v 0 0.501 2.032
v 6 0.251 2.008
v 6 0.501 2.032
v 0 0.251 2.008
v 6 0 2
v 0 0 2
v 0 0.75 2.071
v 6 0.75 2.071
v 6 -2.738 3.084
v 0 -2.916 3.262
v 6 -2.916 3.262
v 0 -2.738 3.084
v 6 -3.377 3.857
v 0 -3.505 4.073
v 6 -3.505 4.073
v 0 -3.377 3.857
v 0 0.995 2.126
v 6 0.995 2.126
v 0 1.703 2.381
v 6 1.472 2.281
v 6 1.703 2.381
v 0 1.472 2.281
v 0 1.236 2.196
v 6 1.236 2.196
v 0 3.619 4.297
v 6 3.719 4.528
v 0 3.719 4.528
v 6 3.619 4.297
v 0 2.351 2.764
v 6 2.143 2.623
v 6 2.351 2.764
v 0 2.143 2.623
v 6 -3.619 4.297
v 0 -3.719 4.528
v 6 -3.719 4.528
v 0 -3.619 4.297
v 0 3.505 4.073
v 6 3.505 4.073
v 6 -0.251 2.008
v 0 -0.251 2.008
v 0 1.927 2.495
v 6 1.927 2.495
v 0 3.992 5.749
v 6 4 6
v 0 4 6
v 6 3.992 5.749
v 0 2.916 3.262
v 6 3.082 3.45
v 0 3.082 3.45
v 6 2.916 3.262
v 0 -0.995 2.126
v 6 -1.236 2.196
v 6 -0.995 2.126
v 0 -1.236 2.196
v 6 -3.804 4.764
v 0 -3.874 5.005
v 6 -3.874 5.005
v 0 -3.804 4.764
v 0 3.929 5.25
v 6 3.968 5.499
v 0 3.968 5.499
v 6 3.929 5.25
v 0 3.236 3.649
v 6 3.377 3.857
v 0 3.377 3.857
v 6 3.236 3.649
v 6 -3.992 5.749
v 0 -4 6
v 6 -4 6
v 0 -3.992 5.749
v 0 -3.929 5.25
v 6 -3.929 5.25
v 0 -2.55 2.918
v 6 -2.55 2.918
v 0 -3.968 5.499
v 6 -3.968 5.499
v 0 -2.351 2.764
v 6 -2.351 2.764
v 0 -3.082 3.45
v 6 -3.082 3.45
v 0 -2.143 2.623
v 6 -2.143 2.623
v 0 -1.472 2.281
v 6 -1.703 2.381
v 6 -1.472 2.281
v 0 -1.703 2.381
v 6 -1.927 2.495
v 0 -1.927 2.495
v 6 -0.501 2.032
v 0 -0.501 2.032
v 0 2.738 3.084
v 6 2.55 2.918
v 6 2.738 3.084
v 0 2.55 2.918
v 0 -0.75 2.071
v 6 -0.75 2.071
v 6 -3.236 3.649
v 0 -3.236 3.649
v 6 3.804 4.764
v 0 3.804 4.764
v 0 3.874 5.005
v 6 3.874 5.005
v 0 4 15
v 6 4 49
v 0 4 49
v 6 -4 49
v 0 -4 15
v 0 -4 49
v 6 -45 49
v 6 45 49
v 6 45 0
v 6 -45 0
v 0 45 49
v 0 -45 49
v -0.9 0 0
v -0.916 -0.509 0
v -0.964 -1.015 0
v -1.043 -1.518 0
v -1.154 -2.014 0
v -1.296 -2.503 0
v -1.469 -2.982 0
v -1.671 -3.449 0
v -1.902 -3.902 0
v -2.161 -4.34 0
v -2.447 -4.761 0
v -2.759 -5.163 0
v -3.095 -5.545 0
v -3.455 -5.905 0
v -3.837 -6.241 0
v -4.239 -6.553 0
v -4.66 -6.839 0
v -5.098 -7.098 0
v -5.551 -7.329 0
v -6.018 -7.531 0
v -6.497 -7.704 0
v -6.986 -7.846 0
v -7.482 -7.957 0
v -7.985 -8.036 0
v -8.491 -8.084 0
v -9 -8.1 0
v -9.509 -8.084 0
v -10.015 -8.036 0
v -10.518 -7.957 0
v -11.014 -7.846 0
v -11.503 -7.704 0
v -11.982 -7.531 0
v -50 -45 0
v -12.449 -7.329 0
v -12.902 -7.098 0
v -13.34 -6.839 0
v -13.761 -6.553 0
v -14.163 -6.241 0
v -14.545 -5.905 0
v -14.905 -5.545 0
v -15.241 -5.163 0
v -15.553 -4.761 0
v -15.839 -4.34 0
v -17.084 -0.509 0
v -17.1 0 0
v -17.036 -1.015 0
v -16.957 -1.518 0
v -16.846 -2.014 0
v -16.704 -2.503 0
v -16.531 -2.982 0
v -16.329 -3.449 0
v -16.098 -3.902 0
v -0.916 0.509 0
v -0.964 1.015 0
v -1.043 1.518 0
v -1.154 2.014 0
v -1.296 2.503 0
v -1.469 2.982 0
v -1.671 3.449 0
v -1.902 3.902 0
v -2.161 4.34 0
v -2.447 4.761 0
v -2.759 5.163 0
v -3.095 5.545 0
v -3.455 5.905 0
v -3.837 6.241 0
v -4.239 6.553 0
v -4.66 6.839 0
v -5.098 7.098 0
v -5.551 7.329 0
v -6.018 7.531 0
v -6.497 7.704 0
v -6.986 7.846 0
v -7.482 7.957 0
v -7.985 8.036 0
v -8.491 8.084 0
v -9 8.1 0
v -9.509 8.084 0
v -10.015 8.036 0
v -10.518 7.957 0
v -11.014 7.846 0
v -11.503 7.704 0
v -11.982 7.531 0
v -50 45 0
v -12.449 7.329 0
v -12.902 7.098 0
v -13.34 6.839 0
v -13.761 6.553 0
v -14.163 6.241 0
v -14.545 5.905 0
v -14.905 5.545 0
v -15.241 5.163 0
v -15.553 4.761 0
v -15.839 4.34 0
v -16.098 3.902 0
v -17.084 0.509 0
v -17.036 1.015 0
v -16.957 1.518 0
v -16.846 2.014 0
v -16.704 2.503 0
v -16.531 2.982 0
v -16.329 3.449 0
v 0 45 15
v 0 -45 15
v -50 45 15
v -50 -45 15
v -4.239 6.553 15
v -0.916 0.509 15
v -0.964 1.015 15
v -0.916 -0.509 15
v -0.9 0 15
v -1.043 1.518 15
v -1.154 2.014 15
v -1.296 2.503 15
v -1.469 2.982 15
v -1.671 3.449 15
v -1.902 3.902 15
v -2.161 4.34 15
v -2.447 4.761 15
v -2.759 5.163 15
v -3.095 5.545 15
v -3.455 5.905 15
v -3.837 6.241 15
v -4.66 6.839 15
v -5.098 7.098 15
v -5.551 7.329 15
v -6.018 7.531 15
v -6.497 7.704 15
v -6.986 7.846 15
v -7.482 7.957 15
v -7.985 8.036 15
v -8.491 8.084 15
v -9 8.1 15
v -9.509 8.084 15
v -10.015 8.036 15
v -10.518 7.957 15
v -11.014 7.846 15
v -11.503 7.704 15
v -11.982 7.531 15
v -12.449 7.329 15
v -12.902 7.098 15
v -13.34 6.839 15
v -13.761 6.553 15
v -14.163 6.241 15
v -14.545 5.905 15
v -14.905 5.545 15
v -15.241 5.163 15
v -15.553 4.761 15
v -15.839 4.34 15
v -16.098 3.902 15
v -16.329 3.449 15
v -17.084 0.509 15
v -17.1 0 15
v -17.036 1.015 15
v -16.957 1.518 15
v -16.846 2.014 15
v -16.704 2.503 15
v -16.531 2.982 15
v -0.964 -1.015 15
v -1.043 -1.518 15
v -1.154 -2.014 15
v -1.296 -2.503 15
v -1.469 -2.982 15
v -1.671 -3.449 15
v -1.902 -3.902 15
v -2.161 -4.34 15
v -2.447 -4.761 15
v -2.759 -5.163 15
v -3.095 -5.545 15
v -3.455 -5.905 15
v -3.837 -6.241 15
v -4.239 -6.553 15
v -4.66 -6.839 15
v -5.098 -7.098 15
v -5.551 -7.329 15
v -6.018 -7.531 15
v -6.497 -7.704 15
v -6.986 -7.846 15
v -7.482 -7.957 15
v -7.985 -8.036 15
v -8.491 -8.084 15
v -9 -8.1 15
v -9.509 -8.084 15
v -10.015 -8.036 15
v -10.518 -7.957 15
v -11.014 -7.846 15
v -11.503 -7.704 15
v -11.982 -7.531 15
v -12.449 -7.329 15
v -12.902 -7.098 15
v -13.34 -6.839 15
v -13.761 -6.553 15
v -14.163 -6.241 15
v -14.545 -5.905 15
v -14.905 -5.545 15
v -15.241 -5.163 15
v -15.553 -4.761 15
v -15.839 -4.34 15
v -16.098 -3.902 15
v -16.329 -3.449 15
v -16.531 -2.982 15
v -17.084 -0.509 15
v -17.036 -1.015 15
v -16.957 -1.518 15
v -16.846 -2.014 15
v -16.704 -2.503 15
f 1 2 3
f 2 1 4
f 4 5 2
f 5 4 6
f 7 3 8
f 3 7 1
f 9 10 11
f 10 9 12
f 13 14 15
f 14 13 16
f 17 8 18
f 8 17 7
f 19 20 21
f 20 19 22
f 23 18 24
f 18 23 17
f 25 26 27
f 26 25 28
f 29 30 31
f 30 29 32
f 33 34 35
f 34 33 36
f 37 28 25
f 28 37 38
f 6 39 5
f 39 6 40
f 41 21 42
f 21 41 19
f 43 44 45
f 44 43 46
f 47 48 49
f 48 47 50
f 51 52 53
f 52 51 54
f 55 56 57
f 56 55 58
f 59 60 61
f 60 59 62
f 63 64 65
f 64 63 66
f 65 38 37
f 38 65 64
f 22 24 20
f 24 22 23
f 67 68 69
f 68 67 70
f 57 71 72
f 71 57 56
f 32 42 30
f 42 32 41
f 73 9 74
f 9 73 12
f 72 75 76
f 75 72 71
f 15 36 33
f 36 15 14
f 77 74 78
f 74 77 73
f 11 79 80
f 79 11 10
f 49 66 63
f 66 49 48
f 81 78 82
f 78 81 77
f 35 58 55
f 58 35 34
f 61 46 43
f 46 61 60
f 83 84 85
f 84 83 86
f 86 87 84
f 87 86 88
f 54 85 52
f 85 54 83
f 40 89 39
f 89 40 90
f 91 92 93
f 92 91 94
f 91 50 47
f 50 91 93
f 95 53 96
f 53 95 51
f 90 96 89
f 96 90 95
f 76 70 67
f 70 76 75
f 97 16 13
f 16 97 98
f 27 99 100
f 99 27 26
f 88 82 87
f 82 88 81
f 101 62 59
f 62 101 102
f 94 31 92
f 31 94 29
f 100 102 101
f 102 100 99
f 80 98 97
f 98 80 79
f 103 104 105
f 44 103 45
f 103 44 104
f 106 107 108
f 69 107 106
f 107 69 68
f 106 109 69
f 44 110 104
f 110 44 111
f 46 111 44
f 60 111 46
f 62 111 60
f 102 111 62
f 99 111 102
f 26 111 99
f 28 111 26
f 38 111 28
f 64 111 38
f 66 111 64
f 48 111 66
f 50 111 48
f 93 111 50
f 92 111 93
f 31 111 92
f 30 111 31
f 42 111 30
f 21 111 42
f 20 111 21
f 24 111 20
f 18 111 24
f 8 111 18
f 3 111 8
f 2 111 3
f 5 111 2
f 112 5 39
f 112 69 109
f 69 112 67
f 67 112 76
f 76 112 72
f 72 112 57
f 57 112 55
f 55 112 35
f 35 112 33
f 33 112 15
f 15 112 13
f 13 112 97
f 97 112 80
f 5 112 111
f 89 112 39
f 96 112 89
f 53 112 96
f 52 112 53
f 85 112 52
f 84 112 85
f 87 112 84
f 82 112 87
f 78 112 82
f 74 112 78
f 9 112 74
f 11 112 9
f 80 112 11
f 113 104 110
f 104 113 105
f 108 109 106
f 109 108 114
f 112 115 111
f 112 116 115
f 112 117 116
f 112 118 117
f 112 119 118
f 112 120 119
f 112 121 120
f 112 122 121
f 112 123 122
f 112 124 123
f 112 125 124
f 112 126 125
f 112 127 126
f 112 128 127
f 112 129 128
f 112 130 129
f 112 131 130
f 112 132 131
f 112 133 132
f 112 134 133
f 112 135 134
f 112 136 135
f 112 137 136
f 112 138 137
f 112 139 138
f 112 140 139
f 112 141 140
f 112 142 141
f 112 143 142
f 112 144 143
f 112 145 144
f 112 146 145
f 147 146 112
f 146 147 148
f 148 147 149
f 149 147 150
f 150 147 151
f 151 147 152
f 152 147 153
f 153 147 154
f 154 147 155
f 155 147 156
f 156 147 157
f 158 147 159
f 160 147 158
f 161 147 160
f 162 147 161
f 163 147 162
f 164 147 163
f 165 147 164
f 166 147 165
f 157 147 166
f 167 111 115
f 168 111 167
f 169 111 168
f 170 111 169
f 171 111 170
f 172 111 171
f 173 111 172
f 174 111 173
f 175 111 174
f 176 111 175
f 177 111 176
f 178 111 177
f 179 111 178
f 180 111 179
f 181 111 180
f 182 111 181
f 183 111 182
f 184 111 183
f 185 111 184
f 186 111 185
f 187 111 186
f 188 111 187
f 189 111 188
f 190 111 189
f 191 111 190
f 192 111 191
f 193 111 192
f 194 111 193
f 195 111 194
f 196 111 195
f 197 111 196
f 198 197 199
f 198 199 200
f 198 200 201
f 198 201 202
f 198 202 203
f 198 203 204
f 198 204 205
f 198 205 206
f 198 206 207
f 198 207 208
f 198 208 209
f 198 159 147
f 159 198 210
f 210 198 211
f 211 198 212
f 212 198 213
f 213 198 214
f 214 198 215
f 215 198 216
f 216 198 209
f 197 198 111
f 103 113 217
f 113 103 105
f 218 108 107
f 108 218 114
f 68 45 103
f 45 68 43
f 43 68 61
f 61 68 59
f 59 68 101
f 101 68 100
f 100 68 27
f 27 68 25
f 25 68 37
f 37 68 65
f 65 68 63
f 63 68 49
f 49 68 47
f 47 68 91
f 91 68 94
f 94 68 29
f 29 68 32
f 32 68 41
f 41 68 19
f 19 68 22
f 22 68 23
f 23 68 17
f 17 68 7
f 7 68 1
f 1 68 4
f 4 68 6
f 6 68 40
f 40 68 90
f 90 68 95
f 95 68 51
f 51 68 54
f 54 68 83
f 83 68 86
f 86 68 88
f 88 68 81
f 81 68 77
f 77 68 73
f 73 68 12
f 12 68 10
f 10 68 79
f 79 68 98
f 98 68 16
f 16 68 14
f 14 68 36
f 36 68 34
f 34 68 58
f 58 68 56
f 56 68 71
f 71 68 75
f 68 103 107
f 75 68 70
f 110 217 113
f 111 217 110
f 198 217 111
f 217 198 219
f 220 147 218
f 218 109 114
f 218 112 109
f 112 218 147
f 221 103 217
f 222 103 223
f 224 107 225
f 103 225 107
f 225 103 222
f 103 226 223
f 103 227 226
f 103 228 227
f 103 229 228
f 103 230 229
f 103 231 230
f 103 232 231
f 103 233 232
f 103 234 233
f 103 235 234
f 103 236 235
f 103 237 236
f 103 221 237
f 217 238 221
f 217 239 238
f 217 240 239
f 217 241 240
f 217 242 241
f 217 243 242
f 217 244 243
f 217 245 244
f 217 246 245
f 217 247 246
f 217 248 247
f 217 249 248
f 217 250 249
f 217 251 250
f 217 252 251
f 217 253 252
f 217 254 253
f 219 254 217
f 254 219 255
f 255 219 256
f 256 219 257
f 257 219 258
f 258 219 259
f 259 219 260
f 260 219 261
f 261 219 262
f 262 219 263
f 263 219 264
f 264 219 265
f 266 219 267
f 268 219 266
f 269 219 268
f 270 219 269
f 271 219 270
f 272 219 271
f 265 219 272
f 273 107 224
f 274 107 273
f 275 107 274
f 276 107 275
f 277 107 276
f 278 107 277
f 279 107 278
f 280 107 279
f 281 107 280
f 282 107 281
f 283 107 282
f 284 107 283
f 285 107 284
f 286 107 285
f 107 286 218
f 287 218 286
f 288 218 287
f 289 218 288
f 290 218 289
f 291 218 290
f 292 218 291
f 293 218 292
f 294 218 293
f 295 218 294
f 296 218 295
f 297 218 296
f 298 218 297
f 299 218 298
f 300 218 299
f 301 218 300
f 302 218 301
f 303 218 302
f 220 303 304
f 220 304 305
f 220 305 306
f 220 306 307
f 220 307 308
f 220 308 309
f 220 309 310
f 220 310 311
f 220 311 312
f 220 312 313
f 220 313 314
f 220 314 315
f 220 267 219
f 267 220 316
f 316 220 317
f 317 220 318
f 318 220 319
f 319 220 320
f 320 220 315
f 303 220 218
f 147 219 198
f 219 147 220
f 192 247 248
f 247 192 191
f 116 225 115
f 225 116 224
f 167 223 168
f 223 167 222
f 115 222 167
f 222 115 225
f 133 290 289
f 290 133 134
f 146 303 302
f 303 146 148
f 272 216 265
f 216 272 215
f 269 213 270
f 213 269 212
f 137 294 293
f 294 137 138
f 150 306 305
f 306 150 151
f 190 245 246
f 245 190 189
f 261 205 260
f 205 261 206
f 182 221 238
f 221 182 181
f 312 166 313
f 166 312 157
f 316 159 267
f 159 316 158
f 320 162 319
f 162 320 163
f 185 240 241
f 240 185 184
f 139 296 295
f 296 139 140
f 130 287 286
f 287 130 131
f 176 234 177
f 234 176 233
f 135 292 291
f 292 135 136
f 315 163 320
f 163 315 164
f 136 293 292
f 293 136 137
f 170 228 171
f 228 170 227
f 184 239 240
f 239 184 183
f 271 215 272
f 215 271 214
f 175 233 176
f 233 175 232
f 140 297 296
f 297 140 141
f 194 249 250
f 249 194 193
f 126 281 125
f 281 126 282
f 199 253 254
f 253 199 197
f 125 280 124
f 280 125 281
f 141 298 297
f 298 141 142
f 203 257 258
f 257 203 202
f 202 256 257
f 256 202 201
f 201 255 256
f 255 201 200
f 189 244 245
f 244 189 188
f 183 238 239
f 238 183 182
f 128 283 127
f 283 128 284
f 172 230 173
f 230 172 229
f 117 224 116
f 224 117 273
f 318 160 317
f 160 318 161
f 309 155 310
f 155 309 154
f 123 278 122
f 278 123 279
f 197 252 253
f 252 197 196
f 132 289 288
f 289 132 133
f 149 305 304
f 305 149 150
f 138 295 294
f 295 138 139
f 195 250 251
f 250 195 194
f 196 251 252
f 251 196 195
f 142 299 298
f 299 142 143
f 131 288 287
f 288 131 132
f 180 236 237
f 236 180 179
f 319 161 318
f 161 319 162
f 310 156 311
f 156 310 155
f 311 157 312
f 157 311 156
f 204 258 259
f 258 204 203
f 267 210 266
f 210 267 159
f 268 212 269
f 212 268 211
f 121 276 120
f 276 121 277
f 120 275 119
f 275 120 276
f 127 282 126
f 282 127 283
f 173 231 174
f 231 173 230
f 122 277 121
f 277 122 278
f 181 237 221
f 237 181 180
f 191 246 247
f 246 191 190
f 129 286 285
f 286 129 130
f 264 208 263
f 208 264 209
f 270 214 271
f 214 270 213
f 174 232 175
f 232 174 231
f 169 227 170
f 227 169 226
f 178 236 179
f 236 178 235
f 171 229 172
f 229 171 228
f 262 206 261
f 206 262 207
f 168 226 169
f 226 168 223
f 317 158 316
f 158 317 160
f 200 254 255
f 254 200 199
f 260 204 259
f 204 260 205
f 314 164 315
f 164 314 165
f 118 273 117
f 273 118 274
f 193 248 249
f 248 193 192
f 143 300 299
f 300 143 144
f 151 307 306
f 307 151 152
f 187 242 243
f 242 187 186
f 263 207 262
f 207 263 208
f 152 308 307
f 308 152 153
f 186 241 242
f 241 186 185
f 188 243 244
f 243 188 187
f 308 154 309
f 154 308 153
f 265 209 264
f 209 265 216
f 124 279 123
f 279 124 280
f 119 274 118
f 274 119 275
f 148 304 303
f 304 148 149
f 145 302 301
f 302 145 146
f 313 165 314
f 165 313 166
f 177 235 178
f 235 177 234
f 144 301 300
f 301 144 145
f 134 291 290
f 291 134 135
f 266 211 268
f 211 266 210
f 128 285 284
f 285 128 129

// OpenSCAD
backstop_thickness = 6;
backstop_height = 34;
rig_width = 90;
rig_length = 50;
rig_thickness = 15;
hole_diameter = 16.2;
hole_distance = 9;
dowel_diameter = 8;
dowel_gap_bottom = 2;


$fn = 100;

backstop_total_height = backstop_height + rig_thickness;

difference() {
    translate([0, -rig_width / 2, 0]) {
        cube([backstop_thickness, rig_width, backstop_total_height]);
    }
    rotate([0, 90, 0]) {
        shift_x = - dowel_gap_bottom - dowel_diameter/2;
        translate([shift_x, 0, -1]) {
            cylinder(2+backstop_thickness, d=dowel_diameter);
        }
        translate([shift_x - backstop_total_height, -dowel_diameter/2, -1]) {
            cube([backstop_total_height, dowel_diameter, 2+backstop_thickness]);
        }
    }
}
difference() {
    translate([-rig_length, -rig_width/2, 0]) {
        cube([rig_length, rig_width, rig_thickness]);
    }
    translate([-hole_distance, 0, -1]) {
        cylinder(h=2+rig_thickness, d=hole_diameter);
    }
}
